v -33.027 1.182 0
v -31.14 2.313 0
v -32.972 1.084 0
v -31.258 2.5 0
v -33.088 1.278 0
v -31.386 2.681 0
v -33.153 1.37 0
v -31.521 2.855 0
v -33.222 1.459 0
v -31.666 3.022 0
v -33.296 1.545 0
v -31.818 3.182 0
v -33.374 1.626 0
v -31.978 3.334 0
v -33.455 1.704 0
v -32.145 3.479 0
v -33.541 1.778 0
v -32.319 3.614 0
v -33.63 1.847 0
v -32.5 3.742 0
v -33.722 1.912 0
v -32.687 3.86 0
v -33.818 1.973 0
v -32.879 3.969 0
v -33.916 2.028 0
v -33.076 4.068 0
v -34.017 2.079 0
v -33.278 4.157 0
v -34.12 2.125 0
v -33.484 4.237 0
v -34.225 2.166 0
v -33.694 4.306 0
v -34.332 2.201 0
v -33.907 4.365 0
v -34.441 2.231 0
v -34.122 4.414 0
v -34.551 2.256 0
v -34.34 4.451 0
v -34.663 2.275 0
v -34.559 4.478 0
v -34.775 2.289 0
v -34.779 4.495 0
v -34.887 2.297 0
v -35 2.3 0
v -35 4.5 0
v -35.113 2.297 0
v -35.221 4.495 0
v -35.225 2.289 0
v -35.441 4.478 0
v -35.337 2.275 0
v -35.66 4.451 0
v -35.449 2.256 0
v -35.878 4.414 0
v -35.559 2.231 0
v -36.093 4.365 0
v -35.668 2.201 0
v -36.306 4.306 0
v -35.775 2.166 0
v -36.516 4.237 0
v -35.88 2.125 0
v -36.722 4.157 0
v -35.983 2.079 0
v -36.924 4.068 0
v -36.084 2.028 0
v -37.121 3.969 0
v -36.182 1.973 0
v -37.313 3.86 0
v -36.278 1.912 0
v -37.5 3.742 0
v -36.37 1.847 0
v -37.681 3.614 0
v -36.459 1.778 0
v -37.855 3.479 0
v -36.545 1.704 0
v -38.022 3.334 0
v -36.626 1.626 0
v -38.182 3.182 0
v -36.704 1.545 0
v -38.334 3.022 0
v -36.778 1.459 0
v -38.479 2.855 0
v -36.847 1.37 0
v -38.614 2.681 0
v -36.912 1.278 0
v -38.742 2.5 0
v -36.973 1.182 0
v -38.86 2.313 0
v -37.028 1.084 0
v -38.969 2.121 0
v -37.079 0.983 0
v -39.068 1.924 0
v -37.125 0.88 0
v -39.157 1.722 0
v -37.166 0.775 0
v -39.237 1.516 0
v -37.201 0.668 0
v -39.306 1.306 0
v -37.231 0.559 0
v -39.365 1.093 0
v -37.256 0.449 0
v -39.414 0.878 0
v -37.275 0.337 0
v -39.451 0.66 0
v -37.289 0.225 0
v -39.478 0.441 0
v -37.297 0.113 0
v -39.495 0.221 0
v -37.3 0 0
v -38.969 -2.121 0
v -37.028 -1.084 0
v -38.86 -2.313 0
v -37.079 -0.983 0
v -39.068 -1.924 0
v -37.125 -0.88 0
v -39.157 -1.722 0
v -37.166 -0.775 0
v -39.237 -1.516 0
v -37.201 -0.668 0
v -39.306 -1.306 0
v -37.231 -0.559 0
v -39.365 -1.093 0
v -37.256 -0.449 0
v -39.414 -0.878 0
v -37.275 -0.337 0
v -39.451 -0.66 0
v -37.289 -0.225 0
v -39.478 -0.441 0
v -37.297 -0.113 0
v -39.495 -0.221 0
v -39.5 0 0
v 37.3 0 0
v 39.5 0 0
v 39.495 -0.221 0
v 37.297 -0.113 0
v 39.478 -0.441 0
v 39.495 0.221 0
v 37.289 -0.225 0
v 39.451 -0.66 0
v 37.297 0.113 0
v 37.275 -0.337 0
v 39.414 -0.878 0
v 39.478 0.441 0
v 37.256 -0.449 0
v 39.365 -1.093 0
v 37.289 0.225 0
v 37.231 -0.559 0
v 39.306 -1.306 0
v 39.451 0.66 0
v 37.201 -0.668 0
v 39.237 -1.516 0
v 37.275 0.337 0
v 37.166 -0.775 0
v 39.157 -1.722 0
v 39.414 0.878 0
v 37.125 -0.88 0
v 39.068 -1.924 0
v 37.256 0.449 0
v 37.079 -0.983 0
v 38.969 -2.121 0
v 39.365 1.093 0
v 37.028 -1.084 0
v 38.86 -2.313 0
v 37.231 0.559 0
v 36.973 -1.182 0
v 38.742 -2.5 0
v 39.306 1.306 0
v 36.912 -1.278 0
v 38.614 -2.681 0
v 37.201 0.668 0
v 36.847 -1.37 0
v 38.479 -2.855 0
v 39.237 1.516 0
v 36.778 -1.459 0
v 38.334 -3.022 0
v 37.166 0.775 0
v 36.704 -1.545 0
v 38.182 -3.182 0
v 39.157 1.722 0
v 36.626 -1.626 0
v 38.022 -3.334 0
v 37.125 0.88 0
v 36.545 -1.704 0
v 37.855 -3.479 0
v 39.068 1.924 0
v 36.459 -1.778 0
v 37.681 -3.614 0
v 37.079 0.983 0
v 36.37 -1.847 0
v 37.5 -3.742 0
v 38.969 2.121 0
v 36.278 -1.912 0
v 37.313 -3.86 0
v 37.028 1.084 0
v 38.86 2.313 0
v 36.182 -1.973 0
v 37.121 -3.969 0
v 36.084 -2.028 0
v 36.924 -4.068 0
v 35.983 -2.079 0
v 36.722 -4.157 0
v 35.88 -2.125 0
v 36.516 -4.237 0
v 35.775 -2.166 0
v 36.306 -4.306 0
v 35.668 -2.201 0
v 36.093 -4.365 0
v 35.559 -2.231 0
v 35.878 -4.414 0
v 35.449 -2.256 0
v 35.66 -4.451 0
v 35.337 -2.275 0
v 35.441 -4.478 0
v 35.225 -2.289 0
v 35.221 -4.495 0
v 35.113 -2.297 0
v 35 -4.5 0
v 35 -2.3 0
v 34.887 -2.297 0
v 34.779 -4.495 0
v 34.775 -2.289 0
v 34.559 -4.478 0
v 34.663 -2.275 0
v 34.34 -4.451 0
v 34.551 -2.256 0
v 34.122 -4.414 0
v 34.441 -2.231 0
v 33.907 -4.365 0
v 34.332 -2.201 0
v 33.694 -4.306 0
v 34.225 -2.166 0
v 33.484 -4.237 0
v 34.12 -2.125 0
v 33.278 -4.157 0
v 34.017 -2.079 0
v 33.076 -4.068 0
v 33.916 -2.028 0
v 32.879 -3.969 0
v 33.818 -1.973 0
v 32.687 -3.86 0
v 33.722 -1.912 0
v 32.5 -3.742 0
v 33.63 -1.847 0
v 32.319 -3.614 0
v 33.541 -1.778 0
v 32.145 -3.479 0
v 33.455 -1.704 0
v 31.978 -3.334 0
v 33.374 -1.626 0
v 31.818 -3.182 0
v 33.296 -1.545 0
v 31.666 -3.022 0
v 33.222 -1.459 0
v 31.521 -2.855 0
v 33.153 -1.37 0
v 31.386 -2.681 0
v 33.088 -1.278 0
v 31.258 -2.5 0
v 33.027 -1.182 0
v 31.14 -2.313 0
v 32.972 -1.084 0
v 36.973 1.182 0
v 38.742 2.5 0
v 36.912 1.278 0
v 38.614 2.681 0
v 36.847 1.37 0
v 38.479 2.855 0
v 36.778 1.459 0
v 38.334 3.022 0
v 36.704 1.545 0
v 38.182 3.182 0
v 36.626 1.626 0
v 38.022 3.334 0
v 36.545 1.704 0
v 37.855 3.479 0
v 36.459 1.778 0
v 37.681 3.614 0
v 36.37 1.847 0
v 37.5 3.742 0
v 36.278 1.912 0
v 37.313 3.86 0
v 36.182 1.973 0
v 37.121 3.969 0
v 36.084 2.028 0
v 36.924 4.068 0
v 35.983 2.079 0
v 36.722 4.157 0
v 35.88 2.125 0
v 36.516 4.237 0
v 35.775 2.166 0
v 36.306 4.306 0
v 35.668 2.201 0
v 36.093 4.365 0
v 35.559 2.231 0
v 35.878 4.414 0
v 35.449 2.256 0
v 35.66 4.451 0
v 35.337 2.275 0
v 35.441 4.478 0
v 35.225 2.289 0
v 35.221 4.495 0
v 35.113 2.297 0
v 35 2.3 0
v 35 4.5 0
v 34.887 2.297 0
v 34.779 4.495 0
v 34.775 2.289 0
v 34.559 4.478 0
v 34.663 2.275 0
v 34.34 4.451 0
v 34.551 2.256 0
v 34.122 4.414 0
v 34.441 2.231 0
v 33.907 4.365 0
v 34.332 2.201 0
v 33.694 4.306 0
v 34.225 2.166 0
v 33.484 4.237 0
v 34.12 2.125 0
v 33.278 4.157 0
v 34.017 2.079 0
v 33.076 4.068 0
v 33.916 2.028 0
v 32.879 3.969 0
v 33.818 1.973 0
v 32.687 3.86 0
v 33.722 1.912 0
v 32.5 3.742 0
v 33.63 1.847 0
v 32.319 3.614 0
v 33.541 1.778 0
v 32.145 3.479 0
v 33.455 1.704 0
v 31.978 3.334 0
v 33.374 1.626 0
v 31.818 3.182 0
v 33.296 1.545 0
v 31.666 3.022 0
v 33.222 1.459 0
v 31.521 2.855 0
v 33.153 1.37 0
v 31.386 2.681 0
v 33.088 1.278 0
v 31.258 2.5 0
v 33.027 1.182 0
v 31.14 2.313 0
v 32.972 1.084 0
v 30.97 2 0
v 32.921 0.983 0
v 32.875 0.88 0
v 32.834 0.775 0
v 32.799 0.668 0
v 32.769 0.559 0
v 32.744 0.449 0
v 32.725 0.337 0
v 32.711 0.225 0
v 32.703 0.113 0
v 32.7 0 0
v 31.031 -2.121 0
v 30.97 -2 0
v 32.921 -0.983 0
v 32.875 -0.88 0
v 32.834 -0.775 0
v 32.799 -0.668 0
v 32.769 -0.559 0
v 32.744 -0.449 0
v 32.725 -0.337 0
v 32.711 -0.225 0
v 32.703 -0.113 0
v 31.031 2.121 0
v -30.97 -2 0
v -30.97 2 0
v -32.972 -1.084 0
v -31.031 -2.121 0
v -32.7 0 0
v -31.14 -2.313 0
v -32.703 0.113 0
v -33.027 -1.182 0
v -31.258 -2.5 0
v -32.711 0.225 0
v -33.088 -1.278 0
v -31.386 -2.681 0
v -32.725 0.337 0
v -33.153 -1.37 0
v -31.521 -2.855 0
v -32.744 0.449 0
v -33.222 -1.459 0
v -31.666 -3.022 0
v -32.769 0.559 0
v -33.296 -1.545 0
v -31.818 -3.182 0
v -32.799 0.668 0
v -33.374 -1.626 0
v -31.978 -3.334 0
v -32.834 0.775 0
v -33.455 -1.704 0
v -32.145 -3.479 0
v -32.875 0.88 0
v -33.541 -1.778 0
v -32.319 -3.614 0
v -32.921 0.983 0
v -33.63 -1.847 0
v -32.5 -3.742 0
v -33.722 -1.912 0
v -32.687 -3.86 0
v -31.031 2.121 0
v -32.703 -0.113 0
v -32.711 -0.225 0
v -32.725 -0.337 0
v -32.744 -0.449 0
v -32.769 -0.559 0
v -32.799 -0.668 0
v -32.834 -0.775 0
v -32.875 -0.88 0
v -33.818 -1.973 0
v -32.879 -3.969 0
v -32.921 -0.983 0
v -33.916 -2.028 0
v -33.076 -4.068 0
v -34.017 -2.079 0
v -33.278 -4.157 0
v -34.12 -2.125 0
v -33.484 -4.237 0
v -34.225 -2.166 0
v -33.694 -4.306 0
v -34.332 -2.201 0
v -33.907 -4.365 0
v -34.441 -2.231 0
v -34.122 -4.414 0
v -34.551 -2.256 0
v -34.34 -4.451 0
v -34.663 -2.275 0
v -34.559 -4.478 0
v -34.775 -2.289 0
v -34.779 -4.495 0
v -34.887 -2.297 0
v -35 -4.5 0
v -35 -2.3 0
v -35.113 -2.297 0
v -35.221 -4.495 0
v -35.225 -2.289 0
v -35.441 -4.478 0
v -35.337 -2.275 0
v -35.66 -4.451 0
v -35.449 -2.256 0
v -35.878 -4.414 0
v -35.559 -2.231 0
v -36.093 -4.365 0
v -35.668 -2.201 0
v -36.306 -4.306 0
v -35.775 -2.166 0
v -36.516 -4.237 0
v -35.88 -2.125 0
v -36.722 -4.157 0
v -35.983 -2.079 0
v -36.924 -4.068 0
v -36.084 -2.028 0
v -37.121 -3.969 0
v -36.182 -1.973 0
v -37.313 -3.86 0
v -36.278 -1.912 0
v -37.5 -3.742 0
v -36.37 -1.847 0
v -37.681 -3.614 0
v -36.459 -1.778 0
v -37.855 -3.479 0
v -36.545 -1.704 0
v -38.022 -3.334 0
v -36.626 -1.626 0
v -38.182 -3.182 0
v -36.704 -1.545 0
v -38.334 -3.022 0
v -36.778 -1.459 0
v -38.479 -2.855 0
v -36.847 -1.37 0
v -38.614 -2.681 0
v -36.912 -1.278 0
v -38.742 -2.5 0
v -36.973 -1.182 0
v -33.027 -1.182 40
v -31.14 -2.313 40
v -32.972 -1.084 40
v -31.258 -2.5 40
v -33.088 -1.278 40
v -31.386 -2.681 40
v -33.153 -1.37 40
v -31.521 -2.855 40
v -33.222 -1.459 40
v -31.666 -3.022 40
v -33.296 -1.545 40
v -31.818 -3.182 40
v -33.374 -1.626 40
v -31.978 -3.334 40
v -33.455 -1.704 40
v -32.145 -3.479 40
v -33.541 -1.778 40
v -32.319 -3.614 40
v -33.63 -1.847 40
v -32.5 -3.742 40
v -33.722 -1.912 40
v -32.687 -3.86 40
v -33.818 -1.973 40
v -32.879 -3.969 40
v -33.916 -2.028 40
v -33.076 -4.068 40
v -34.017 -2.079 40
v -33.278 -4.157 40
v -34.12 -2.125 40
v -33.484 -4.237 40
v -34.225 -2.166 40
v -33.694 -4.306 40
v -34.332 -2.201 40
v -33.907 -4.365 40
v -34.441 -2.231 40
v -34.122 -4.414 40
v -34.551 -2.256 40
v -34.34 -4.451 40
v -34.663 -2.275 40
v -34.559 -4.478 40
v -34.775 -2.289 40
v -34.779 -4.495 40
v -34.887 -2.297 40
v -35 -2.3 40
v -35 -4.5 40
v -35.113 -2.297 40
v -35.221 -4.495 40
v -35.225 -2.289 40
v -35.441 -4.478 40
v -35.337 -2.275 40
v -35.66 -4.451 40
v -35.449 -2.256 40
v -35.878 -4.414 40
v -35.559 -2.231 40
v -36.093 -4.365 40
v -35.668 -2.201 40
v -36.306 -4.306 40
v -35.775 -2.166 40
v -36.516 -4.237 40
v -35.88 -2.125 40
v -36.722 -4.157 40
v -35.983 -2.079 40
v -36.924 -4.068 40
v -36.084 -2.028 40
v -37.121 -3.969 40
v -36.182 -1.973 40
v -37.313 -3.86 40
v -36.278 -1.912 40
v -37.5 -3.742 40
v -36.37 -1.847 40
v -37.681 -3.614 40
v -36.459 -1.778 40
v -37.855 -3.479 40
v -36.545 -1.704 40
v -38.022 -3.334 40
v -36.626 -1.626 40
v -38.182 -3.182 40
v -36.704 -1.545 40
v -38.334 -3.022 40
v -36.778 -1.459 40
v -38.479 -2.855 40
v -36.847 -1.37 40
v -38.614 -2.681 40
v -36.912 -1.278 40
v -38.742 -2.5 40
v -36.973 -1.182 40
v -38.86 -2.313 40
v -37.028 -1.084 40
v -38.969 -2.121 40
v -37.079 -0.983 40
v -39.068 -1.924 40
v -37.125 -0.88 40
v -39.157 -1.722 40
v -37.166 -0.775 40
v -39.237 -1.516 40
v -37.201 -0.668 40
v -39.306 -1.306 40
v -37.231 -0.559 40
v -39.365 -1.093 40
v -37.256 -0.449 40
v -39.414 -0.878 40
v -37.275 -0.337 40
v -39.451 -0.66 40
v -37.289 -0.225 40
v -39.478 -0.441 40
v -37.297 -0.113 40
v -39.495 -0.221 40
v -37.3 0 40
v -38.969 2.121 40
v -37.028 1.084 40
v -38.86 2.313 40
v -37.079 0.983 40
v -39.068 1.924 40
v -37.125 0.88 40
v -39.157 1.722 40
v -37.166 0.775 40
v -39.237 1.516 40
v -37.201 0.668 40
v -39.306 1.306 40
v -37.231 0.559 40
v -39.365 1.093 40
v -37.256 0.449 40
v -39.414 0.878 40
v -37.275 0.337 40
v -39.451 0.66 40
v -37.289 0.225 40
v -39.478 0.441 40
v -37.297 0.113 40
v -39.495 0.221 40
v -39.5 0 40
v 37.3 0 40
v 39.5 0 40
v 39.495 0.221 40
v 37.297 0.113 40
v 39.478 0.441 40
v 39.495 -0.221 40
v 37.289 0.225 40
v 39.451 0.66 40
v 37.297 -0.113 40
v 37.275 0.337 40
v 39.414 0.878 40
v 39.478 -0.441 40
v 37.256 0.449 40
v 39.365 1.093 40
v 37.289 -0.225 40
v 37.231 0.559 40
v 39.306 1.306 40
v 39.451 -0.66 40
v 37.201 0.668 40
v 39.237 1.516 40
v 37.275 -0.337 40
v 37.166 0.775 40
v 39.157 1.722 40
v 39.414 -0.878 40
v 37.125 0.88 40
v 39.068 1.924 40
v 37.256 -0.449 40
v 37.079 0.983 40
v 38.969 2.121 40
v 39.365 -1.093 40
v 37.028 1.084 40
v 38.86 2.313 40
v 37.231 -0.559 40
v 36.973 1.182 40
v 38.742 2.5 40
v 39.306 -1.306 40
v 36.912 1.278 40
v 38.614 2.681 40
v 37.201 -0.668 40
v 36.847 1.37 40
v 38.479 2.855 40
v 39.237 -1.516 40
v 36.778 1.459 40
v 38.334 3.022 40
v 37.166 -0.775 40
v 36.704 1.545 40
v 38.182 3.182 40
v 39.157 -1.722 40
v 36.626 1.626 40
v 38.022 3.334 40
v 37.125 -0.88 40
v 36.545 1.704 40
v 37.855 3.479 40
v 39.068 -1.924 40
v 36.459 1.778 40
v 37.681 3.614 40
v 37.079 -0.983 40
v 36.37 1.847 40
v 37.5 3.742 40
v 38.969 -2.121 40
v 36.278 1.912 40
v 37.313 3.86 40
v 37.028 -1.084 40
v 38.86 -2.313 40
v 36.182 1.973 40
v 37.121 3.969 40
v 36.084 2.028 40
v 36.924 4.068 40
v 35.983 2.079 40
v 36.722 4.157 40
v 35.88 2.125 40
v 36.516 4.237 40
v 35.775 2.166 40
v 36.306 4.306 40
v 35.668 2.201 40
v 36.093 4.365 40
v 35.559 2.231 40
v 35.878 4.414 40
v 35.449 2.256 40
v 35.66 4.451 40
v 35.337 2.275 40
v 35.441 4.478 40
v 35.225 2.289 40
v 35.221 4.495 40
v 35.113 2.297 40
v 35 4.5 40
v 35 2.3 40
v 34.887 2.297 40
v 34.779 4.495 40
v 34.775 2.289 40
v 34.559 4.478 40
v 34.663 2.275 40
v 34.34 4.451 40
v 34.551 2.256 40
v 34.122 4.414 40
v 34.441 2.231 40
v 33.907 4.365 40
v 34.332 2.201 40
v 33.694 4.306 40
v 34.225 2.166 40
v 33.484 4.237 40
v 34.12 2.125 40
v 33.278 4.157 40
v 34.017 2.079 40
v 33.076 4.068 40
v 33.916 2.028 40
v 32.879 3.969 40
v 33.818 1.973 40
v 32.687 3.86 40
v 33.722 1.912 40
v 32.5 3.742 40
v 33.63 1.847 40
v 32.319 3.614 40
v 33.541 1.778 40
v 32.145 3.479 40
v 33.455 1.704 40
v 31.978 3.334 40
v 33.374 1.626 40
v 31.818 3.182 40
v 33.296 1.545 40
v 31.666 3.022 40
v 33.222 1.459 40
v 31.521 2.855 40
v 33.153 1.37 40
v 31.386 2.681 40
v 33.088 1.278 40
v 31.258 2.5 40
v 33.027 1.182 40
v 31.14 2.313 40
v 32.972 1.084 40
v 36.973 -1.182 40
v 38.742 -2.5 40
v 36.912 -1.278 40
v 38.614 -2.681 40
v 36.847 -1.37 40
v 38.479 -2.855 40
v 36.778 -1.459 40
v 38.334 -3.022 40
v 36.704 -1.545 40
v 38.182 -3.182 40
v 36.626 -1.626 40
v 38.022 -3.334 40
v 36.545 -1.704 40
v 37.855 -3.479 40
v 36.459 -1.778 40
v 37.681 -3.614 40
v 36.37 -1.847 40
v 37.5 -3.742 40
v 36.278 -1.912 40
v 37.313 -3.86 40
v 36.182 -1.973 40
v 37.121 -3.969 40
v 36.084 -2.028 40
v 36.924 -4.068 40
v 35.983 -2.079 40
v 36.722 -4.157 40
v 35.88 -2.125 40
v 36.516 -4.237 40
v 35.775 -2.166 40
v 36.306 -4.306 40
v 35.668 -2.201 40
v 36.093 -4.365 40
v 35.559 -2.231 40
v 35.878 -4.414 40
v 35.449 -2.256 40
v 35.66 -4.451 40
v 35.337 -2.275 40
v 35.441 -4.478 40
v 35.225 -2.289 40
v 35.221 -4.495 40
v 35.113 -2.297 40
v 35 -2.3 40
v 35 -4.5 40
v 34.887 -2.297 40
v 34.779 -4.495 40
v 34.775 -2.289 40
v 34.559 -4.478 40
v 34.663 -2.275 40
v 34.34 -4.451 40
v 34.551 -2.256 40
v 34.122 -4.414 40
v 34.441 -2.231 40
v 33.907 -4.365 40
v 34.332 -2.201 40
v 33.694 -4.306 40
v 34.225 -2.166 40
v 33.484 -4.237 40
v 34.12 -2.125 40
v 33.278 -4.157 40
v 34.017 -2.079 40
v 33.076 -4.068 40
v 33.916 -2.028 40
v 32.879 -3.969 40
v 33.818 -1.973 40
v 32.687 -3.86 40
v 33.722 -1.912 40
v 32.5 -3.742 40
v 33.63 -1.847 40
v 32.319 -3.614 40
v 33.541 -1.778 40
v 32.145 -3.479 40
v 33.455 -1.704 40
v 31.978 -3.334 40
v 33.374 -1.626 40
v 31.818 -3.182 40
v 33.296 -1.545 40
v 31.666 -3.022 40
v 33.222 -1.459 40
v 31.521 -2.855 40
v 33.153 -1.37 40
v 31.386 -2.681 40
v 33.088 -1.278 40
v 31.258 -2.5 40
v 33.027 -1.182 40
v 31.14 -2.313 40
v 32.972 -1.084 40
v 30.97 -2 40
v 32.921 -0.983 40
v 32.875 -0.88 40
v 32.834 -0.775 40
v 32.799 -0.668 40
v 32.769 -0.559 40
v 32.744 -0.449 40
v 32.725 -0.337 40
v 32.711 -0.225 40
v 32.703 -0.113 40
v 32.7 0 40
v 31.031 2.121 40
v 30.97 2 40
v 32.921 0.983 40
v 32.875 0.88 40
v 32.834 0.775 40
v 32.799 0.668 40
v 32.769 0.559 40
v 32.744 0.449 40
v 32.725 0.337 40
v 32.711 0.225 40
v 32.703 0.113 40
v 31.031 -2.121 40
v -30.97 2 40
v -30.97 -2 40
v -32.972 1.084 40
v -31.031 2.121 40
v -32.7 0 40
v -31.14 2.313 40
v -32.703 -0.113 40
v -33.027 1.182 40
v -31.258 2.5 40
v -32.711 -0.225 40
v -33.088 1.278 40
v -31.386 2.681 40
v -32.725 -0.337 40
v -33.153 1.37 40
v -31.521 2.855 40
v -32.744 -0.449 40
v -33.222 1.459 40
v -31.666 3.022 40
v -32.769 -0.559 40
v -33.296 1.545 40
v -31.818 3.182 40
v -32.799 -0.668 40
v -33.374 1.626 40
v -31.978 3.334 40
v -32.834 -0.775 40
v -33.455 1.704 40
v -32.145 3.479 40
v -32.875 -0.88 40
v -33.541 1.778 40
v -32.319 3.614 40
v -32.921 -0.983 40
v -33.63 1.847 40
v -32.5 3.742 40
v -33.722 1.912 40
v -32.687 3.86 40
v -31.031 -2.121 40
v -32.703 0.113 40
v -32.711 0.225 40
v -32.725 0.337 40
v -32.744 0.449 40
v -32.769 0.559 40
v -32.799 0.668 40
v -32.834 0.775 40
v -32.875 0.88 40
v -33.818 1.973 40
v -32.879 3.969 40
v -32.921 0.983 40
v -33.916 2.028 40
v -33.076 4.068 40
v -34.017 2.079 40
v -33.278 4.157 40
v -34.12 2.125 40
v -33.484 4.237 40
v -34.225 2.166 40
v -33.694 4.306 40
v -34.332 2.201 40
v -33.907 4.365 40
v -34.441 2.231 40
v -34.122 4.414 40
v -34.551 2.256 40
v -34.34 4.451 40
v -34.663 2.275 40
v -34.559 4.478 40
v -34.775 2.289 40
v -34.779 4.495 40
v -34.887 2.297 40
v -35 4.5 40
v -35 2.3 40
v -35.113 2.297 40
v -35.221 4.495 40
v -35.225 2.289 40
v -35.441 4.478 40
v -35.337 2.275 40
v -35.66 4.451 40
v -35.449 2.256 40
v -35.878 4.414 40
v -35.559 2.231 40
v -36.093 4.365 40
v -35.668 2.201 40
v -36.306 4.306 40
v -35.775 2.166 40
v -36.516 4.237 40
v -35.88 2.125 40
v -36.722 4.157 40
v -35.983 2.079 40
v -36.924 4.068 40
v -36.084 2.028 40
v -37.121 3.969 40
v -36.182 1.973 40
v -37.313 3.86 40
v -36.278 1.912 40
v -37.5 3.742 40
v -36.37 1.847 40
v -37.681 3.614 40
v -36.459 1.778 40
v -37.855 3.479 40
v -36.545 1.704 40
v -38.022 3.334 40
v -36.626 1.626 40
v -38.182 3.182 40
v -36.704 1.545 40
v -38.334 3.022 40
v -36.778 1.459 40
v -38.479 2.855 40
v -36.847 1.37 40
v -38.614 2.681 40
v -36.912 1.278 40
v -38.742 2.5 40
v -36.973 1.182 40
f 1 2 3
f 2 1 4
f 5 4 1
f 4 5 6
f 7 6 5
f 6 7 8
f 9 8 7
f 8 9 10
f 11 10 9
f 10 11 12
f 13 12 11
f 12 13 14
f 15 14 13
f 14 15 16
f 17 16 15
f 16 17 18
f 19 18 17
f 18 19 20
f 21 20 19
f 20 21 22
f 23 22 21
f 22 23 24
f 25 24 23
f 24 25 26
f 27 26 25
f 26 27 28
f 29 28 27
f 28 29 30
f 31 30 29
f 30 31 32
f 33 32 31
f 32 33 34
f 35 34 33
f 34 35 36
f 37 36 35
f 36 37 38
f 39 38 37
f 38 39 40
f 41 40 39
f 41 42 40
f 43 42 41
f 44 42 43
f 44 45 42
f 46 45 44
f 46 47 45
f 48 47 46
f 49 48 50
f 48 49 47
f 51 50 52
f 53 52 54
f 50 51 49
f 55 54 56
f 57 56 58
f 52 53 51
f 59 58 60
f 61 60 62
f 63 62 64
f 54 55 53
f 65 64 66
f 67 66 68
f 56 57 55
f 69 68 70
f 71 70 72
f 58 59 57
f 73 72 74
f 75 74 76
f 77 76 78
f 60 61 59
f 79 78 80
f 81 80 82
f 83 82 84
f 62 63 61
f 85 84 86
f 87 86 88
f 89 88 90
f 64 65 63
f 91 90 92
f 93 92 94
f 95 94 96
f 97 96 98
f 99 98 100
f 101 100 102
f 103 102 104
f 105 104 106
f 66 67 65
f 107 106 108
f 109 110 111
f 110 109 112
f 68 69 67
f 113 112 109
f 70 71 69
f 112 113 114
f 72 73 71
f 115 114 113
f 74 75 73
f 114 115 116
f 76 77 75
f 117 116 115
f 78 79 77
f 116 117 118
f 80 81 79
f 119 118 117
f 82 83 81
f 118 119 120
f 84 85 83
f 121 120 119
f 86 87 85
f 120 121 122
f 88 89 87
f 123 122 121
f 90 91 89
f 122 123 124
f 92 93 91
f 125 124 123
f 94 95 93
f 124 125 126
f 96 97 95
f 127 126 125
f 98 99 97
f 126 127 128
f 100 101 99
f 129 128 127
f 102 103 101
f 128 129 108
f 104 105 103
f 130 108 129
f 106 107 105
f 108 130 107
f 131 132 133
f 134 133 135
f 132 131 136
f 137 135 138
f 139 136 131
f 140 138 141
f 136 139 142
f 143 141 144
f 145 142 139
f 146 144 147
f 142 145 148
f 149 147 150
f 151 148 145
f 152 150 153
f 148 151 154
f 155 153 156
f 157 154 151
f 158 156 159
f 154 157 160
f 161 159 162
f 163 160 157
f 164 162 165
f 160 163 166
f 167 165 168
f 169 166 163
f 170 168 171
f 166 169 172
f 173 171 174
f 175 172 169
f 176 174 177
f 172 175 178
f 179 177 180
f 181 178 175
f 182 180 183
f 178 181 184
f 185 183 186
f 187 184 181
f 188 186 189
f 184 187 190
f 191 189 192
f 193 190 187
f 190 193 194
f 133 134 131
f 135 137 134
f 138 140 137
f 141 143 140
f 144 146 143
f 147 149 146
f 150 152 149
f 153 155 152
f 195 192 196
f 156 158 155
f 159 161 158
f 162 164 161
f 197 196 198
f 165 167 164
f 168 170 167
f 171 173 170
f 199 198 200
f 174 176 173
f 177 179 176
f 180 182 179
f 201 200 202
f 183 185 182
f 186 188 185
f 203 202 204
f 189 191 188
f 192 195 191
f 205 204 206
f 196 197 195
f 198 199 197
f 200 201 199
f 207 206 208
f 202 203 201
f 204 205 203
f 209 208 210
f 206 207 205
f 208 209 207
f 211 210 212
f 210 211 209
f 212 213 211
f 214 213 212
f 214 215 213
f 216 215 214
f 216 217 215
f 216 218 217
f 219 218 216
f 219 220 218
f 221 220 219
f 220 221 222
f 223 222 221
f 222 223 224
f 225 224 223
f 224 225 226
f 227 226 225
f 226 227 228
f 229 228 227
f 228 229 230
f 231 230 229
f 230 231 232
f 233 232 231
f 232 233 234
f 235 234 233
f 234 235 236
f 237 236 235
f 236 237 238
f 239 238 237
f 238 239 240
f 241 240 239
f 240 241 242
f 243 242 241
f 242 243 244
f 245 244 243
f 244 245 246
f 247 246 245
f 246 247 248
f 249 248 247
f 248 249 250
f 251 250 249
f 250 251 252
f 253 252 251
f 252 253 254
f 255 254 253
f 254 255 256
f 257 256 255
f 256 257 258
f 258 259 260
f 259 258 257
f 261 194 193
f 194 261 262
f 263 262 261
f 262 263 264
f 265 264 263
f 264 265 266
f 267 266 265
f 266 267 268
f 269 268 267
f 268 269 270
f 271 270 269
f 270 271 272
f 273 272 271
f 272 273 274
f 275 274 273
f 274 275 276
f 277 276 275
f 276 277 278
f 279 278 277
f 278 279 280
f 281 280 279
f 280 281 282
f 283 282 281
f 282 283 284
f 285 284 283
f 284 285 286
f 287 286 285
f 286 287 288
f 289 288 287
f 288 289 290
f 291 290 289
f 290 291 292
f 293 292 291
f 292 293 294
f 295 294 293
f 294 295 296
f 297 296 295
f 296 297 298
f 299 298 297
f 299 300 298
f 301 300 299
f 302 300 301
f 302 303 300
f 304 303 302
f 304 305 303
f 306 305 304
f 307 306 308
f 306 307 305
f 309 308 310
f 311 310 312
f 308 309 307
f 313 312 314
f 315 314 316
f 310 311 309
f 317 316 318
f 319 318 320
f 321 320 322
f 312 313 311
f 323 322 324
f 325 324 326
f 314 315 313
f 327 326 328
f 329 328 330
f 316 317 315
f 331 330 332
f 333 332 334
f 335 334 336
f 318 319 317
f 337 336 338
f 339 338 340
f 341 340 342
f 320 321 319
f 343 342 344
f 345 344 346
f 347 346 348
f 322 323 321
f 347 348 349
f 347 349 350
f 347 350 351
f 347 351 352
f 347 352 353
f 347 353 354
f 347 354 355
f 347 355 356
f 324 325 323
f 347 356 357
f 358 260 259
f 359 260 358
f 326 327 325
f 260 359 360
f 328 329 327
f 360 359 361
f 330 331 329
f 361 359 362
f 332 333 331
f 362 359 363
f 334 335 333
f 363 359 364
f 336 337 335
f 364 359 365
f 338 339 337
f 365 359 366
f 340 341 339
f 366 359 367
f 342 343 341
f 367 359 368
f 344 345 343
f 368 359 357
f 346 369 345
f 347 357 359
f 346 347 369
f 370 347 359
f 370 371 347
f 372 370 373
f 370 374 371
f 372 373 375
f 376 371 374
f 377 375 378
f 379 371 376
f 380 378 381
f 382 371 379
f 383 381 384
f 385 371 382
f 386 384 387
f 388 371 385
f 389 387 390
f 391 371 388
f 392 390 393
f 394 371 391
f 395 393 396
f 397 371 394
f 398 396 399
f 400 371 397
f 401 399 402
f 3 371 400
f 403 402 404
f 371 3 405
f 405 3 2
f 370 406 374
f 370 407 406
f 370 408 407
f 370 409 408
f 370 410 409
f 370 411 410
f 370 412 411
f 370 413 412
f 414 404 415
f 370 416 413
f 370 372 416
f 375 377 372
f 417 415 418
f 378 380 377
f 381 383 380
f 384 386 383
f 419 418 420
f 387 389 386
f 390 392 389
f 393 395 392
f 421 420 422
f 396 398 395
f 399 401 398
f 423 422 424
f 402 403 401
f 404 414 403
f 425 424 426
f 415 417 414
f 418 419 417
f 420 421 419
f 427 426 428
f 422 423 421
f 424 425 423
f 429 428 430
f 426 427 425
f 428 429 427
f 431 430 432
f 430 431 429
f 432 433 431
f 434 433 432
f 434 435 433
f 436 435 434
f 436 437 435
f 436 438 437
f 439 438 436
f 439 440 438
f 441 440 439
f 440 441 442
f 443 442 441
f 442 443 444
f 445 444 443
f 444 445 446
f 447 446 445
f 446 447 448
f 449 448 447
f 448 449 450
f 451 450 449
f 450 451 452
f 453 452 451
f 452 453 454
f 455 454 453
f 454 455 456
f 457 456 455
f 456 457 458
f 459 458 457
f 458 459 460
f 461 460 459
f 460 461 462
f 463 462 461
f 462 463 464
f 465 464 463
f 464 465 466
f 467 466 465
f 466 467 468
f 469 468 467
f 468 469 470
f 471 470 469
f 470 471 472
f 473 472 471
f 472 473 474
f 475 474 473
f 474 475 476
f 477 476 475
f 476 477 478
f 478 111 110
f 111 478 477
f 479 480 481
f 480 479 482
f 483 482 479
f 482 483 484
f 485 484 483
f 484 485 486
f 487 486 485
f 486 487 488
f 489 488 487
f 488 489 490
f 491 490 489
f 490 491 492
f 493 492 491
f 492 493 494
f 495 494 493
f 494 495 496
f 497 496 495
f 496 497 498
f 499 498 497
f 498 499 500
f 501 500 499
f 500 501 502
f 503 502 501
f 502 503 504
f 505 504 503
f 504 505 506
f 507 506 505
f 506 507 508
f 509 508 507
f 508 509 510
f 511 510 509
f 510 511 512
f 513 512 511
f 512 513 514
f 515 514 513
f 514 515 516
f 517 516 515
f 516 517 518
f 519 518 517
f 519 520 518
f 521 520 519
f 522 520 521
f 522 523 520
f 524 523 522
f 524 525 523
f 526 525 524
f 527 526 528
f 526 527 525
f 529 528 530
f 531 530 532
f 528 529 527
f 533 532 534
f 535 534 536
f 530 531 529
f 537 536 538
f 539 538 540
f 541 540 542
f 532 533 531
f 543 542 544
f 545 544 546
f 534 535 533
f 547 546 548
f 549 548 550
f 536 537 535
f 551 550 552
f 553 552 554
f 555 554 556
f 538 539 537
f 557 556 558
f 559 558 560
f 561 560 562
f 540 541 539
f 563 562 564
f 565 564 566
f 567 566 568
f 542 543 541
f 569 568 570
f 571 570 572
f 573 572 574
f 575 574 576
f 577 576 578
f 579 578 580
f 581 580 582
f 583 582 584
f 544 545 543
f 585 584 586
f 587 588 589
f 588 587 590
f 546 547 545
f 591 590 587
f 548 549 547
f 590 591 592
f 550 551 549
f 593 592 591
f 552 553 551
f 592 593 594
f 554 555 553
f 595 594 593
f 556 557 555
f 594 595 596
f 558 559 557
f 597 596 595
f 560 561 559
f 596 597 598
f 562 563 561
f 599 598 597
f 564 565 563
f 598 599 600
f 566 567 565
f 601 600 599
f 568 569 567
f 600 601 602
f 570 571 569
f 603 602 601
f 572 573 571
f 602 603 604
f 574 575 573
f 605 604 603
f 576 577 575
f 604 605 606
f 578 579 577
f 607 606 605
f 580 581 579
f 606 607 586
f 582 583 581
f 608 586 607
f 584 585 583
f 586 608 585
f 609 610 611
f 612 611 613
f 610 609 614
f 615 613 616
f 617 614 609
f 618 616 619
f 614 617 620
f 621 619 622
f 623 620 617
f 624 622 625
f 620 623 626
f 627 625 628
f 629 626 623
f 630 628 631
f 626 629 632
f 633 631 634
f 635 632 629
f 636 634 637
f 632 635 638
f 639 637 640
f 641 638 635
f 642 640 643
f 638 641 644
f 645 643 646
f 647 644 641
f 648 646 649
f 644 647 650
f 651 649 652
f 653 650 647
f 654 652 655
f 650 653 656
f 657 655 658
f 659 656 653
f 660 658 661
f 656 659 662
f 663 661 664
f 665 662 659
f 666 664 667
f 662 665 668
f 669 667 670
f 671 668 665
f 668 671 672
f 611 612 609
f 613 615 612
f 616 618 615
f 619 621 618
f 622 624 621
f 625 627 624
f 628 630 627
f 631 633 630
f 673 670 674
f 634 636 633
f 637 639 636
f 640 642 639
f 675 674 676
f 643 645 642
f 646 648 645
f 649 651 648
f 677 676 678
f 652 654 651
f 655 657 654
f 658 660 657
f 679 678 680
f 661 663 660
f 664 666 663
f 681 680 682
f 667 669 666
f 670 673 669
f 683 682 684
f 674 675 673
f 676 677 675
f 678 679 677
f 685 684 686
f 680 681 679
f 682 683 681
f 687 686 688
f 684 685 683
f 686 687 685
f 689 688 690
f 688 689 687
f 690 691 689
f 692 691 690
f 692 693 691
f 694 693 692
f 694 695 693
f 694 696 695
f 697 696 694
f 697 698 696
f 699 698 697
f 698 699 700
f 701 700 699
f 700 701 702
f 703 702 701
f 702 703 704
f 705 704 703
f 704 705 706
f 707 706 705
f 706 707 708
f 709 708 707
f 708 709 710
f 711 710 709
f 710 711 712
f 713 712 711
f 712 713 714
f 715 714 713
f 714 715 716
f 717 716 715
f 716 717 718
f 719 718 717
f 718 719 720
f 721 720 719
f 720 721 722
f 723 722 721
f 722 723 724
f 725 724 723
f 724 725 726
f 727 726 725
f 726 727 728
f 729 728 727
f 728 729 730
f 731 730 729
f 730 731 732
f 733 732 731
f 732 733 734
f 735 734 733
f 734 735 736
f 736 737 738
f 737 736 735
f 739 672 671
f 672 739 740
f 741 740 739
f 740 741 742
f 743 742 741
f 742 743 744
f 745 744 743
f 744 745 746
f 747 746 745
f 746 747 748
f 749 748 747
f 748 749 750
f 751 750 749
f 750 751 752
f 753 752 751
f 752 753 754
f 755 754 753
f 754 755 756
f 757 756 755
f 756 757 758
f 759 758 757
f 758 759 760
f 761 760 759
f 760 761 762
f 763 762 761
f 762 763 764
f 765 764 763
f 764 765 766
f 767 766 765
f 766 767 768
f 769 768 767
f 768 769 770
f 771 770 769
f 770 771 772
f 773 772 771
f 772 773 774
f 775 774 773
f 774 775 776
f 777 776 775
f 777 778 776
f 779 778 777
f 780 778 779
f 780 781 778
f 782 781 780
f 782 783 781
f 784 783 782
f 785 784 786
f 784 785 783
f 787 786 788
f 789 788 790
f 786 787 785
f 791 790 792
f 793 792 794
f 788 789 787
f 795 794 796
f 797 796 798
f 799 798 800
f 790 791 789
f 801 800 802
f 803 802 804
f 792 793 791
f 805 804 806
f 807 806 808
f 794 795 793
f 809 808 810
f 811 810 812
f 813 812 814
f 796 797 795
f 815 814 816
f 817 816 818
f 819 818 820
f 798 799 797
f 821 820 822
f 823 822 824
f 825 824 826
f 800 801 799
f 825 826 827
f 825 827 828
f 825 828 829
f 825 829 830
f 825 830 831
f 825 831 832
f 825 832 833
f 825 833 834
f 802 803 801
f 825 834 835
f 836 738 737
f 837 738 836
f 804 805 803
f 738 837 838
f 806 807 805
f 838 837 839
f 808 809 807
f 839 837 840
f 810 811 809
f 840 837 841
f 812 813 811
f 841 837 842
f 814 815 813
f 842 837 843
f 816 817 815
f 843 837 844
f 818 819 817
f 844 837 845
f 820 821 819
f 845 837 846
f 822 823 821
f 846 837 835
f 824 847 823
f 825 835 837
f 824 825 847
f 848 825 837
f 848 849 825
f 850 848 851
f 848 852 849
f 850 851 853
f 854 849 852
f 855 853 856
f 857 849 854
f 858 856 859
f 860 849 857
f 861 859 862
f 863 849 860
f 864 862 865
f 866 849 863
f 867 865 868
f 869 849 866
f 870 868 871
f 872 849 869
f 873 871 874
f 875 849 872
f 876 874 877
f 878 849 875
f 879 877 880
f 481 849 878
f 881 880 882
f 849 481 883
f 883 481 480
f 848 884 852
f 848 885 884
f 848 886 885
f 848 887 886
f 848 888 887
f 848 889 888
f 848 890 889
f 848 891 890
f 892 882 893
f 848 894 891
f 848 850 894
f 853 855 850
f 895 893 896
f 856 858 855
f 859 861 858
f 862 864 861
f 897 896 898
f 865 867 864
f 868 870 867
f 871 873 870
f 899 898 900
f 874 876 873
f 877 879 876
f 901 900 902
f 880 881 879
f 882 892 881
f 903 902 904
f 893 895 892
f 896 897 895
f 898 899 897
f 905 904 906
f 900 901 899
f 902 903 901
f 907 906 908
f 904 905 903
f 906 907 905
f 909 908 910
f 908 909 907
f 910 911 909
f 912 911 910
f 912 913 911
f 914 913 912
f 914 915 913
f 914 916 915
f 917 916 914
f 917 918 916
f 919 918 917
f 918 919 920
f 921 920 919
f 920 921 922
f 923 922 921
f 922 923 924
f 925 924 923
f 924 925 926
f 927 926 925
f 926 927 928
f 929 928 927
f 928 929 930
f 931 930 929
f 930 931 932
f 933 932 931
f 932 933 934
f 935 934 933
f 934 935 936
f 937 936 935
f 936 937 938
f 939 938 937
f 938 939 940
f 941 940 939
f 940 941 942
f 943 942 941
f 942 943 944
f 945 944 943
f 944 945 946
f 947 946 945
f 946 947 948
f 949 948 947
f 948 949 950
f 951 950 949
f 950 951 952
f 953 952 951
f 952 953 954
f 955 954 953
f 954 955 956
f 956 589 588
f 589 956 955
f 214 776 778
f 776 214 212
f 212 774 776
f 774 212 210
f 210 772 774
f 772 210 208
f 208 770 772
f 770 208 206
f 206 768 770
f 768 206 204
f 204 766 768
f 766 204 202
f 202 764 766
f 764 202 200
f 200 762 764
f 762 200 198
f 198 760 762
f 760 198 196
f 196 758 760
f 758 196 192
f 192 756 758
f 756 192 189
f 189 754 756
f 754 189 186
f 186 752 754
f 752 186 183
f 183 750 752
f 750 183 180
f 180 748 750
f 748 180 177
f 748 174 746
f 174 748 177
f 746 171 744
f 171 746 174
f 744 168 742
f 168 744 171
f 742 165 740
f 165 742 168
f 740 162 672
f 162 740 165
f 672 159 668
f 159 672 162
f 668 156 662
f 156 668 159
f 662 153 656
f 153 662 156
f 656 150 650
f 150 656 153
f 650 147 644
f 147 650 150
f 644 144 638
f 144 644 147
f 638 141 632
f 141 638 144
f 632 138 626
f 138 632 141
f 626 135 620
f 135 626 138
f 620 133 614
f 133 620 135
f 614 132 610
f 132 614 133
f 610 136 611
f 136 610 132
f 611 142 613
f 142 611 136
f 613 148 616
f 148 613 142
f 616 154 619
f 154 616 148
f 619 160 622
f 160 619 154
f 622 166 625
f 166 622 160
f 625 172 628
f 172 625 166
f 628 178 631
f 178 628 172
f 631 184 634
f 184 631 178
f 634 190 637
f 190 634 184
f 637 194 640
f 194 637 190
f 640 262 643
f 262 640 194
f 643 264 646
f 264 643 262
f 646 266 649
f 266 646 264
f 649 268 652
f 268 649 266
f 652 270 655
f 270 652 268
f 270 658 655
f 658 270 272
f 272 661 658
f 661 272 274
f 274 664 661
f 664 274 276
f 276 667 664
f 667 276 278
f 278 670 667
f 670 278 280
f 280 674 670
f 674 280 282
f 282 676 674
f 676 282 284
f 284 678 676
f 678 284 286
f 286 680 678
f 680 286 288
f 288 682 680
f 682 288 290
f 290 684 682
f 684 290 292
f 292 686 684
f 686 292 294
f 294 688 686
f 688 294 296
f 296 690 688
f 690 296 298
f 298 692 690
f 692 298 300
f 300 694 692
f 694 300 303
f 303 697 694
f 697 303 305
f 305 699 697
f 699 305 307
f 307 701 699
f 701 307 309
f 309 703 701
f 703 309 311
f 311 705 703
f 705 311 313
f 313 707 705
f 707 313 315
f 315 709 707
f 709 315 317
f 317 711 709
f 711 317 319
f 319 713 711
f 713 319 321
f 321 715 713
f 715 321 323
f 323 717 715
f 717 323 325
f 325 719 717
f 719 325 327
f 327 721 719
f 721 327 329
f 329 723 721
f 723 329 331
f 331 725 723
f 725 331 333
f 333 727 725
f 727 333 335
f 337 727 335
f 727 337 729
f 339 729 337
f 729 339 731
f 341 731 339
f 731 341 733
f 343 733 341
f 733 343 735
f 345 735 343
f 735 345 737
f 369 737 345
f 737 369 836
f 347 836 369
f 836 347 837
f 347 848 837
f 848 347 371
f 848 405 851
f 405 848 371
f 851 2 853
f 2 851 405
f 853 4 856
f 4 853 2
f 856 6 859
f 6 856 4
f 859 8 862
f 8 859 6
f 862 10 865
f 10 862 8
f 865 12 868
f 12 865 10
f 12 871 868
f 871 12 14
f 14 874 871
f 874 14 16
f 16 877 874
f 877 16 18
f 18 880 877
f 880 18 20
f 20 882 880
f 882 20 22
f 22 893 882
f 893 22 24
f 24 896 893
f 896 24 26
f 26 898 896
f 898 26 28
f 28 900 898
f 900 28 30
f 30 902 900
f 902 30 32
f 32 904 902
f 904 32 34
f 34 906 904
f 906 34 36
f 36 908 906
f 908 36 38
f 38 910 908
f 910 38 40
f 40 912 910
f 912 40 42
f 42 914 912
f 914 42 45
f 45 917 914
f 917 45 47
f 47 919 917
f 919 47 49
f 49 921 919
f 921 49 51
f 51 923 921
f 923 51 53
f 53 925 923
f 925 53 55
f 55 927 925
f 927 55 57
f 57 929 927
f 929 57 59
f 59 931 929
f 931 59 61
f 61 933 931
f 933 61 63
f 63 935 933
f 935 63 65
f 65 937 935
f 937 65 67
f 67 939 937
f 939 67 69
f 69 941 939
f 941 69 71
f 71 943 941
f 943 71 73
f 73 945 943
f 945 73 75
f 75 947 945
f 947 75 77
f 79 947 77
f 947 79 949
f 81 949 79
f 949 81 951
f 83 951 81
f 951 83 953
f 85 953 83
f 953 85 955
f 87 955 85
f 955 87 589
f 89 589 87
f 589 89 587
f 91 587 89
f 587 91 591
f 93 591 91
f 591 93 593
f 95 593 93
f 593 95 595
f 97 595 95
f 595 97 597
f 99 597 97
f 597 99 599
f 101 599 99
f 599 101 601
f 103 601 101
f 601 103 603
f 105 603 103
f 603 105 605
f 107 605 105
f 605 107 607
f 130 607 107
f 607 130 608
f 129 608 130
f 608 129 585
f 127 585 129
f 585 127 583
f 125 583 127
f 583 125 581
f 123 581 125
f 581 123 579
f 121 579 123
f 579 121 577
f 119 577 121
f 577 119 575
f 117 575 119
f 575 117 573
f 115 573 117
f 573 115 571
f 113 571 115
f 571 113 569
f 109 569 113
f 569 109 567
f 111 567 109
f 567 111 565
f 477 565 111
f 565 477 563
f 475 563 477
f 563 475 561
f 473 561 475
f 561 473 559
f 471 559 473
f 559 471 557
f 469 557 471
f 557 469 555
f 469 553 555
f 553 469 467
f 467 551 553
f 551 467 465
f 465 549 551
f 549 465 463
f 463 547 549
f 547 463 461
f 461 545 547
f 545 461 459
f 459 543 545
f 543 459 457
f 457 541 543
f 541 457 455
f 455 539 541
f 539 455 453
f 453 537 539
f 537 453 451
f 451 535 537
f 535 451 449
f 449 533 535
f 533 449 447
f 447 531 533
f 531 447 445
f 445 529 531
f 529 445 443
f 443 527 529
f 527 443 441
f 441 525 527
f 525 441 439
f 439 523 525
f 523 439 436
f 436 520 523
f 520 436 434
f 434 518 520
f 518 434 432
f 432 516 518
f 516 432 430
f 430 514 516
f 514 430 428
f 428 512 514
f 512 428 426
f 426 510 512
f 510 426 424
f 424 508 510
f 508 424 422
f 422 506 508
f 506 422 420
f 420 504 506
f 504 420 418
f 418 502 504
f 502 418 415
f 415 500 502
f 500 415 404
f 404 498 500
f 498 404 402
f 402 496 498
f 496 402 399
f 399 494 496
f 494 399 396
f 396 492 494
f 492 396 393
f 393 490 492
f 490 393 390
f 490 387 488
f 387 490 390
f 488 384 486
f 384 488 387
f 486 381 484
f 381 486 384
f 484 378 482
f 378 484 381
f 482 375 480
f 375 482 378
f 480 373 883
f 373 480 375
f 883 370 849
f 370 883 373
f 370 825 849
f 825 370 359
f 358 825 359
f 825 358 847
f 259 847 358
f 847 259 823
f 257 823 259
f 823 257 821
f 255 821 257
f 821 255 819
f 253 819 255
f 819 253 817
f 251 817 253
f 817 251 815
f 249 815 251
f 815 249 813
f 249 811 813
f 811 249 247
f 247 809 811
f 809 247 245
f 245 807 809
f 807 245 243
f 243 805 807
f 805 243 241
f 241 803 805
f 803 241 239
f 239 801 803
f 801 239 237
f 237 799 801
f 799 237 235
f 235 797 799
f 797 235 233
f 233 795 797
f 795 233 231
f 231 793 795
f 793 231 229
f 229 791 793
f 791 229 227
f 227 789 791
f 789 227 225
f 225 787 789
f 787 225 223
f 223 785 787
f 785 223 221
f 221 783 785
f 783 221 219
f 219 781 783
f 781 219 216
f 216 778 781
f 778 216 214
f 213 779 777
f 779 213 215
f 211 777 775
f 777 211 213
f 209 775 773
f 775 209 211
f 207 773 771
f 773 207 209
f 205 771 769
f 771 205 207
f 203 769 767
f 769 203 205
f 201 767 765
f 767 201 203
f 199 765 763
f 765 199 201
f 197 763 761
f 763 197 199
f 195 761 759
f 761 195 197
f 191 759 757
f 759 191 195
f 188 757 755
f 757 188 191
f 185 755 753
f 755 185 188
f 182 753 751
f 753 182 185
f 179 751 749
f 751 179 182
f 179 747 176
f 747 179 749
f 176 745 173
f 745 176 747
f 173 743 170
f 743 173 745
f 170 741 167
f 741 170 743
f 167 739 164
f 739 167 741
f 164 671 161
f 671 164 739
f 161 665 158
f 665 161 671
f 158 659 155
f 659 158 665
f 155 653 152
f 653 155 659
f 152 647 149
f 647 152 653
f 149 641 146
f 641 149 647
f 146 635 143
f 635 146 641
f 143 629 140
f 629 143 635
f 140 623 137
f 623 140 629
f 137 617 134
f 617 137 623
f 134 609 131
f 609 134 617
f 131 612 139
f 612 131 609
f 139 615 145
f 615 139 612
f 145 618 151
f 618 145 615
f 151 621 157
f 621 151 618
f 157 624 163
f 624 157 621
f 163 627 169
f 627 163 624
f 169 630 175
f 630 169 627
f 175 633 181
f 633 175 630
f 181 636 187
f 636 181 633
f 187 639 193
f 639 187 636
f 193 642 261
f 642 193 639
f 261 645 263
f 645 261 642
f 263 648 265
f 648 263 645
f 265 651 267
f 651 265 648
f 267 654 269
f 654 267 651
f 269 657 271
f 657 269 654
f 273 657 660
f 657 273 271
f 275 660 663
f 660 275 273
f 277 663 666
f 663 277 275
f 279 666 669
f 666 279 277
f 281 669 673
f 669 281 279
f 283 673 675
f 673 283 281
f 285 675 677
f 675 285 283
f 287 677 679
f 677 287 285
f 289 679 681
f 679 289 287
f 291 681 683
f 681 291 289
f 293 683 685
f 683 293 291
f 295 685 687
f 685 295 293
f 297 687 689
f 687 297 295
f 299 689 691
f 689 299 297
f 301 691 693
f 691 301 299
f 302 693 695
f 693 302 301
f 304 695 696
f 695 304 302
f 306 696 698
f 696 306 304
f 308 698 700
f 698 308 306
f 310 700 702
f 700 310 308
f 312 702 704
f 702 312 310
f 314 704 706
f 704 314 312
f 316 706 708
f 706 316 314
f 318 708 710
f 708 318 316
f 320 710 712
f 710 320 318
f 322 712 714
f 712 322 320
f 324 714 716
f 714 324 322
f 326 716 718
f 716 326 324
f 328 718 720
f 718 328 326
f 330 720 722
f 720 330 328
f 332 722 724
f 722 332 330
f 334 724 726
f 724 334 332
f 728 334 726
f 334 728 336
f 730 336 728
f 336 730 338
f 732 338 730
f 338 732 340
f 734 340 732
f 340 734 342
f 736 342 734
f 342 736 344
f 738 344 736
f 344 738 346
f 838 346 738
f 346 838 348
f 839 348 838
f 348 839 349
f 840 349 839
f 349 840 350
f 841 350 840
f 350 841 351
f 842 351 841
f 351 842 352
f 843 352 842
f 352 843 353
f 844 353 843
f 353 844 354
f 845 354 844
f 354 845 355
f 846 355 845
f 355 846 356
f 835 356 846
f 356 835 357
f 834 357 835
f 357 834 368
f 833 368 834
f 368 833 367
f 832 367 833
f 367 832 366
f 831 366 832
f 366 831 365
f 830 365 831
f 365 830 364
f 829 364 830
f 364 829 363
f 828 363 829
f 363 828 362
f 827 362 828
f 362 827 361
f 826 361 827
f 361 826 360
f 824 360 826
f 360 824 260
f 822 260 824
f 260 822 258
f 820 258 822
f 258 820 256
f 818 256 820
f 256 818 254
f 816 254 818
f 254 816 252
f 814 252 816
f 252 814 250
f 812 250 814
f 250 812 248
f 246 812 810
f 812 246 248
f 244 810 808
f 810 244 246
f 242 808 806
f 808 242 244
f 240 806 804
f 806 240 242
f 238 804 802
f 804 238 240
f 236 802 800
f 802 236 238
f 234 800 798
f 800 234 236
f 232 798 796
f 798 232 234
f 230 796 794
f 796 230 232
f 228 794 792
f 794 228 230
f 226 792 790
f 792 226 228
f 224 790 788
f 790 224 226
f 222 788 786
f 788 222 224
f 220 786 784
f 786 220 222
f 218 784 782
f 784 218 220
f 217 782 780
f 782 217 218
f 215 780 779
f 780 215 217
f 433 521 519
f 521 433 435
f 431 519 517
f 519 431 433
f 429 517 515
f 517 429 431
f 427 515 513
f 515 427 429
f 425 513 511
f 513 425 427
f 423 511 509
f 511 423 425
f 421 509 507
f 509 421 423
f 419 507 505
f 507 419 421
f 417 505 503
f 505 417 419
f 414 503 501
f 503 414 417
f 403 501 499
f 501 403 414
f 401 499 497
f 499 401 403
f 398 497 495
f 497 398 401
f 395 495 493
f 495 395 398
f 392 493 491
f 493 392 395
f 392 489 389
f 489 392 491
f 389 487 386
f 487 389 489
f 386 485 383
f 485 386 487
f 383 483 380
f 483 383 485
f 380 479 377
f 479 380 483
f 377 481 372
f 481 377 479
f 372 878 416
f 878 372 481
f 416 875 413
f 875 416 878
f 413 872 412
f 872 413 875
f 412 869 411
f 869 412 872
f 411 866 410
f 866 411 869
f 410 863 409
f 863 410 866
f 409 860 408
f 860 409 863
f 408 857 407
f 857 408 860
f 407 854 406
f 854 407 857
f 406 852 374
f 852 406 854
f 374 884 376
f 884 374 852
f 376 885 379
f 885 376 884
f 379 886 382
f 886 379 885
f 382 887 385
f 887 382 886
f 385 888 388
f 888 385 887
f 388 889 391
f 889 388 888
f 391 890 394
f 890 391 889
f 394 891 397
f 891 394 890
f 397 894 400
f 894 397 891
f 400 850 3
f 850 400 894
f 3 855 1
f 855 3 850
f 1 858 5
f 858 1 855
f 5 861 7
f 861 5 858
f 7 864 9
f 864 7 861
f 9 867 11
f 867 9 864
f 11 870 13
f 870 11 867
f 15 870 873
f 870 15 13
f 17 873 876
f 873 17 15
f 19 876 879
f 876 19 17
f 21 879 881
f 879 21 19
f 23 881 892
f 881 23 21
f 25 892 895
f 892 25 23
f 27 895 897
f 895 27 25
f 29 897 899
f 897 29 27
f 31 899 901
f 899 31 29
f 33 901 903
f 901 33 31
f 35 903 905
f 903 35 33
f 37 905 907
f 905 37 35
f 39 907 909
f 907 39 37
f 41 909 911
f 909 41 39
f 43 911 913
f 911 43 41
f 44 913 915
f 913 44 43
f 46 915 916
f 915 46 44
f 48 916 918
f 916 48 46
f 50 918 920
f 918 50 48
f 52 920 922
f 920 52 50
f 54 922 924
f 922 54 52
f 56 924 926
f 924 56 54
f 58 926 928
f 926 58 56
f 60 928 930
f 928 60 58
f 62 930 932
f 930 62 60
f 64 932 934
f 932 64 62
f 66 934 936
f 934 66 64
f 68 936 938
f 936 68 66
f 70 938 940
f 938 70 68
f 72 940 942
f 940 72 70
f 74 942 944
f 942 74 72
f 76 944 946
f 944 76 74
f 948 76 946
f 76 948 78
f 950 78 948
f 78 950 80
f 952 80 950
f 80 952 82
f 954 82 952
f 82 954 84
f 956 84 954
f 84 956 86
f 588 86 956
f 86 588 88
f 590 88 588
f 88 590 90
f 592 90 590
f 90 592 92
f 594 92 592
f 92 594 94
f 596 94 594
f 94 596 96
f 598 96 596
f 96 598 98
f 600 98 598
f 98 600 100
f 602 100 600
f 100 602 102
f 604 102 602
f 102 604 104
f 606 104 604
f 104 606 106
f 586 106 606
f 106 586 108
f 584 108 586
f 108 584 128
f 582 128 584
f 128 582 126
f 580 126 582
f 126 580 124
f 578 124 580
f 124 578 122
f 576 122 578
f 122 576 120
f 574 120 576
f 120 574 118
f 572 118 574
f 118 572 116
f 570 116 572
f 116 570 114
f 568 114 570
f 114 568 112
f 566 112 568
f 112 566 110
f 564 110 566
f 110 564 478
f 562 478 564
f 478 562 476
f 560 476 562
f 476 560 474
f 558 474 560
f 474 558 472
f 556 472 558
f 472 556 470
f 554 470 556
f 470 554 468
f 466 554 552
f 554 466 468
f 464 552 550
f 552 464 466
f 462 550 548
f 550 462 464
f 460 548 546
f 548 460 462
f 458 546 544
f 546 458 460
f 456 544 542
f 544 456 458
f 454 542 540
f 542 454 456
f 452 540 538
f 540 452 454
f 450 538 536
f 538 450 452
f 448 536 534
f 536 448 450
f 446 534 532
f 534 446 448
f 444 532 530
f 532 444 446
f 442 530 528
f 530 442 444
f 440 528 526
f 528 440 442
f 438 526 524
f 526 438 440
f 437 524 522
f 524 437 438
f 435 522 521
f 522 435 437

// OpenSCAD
$fn=128;

height=40;
width=70;
wall_thickness=2;
inner_radius=2.3;
outer_radius=4.5;

difference() {
    linear_extrude(height){
        translate([width / 2, 0, 0]) circle(outer_radius);
        translate([-width / 2, 0, 0]) circle(outer_radius);

        hull(){
            translate([width / 2, 0, 0]) circle(wall_thickness);
            translate([-width / 2, 0, 0]) circle(wall_thickness);
        }
    }

    linear_extrude(height){        
        translate([width / 2, 0, 0]) circle(inner_radius);
        translate([-width / 2, 0, 0]) circle(inner_radius);
    }
}
